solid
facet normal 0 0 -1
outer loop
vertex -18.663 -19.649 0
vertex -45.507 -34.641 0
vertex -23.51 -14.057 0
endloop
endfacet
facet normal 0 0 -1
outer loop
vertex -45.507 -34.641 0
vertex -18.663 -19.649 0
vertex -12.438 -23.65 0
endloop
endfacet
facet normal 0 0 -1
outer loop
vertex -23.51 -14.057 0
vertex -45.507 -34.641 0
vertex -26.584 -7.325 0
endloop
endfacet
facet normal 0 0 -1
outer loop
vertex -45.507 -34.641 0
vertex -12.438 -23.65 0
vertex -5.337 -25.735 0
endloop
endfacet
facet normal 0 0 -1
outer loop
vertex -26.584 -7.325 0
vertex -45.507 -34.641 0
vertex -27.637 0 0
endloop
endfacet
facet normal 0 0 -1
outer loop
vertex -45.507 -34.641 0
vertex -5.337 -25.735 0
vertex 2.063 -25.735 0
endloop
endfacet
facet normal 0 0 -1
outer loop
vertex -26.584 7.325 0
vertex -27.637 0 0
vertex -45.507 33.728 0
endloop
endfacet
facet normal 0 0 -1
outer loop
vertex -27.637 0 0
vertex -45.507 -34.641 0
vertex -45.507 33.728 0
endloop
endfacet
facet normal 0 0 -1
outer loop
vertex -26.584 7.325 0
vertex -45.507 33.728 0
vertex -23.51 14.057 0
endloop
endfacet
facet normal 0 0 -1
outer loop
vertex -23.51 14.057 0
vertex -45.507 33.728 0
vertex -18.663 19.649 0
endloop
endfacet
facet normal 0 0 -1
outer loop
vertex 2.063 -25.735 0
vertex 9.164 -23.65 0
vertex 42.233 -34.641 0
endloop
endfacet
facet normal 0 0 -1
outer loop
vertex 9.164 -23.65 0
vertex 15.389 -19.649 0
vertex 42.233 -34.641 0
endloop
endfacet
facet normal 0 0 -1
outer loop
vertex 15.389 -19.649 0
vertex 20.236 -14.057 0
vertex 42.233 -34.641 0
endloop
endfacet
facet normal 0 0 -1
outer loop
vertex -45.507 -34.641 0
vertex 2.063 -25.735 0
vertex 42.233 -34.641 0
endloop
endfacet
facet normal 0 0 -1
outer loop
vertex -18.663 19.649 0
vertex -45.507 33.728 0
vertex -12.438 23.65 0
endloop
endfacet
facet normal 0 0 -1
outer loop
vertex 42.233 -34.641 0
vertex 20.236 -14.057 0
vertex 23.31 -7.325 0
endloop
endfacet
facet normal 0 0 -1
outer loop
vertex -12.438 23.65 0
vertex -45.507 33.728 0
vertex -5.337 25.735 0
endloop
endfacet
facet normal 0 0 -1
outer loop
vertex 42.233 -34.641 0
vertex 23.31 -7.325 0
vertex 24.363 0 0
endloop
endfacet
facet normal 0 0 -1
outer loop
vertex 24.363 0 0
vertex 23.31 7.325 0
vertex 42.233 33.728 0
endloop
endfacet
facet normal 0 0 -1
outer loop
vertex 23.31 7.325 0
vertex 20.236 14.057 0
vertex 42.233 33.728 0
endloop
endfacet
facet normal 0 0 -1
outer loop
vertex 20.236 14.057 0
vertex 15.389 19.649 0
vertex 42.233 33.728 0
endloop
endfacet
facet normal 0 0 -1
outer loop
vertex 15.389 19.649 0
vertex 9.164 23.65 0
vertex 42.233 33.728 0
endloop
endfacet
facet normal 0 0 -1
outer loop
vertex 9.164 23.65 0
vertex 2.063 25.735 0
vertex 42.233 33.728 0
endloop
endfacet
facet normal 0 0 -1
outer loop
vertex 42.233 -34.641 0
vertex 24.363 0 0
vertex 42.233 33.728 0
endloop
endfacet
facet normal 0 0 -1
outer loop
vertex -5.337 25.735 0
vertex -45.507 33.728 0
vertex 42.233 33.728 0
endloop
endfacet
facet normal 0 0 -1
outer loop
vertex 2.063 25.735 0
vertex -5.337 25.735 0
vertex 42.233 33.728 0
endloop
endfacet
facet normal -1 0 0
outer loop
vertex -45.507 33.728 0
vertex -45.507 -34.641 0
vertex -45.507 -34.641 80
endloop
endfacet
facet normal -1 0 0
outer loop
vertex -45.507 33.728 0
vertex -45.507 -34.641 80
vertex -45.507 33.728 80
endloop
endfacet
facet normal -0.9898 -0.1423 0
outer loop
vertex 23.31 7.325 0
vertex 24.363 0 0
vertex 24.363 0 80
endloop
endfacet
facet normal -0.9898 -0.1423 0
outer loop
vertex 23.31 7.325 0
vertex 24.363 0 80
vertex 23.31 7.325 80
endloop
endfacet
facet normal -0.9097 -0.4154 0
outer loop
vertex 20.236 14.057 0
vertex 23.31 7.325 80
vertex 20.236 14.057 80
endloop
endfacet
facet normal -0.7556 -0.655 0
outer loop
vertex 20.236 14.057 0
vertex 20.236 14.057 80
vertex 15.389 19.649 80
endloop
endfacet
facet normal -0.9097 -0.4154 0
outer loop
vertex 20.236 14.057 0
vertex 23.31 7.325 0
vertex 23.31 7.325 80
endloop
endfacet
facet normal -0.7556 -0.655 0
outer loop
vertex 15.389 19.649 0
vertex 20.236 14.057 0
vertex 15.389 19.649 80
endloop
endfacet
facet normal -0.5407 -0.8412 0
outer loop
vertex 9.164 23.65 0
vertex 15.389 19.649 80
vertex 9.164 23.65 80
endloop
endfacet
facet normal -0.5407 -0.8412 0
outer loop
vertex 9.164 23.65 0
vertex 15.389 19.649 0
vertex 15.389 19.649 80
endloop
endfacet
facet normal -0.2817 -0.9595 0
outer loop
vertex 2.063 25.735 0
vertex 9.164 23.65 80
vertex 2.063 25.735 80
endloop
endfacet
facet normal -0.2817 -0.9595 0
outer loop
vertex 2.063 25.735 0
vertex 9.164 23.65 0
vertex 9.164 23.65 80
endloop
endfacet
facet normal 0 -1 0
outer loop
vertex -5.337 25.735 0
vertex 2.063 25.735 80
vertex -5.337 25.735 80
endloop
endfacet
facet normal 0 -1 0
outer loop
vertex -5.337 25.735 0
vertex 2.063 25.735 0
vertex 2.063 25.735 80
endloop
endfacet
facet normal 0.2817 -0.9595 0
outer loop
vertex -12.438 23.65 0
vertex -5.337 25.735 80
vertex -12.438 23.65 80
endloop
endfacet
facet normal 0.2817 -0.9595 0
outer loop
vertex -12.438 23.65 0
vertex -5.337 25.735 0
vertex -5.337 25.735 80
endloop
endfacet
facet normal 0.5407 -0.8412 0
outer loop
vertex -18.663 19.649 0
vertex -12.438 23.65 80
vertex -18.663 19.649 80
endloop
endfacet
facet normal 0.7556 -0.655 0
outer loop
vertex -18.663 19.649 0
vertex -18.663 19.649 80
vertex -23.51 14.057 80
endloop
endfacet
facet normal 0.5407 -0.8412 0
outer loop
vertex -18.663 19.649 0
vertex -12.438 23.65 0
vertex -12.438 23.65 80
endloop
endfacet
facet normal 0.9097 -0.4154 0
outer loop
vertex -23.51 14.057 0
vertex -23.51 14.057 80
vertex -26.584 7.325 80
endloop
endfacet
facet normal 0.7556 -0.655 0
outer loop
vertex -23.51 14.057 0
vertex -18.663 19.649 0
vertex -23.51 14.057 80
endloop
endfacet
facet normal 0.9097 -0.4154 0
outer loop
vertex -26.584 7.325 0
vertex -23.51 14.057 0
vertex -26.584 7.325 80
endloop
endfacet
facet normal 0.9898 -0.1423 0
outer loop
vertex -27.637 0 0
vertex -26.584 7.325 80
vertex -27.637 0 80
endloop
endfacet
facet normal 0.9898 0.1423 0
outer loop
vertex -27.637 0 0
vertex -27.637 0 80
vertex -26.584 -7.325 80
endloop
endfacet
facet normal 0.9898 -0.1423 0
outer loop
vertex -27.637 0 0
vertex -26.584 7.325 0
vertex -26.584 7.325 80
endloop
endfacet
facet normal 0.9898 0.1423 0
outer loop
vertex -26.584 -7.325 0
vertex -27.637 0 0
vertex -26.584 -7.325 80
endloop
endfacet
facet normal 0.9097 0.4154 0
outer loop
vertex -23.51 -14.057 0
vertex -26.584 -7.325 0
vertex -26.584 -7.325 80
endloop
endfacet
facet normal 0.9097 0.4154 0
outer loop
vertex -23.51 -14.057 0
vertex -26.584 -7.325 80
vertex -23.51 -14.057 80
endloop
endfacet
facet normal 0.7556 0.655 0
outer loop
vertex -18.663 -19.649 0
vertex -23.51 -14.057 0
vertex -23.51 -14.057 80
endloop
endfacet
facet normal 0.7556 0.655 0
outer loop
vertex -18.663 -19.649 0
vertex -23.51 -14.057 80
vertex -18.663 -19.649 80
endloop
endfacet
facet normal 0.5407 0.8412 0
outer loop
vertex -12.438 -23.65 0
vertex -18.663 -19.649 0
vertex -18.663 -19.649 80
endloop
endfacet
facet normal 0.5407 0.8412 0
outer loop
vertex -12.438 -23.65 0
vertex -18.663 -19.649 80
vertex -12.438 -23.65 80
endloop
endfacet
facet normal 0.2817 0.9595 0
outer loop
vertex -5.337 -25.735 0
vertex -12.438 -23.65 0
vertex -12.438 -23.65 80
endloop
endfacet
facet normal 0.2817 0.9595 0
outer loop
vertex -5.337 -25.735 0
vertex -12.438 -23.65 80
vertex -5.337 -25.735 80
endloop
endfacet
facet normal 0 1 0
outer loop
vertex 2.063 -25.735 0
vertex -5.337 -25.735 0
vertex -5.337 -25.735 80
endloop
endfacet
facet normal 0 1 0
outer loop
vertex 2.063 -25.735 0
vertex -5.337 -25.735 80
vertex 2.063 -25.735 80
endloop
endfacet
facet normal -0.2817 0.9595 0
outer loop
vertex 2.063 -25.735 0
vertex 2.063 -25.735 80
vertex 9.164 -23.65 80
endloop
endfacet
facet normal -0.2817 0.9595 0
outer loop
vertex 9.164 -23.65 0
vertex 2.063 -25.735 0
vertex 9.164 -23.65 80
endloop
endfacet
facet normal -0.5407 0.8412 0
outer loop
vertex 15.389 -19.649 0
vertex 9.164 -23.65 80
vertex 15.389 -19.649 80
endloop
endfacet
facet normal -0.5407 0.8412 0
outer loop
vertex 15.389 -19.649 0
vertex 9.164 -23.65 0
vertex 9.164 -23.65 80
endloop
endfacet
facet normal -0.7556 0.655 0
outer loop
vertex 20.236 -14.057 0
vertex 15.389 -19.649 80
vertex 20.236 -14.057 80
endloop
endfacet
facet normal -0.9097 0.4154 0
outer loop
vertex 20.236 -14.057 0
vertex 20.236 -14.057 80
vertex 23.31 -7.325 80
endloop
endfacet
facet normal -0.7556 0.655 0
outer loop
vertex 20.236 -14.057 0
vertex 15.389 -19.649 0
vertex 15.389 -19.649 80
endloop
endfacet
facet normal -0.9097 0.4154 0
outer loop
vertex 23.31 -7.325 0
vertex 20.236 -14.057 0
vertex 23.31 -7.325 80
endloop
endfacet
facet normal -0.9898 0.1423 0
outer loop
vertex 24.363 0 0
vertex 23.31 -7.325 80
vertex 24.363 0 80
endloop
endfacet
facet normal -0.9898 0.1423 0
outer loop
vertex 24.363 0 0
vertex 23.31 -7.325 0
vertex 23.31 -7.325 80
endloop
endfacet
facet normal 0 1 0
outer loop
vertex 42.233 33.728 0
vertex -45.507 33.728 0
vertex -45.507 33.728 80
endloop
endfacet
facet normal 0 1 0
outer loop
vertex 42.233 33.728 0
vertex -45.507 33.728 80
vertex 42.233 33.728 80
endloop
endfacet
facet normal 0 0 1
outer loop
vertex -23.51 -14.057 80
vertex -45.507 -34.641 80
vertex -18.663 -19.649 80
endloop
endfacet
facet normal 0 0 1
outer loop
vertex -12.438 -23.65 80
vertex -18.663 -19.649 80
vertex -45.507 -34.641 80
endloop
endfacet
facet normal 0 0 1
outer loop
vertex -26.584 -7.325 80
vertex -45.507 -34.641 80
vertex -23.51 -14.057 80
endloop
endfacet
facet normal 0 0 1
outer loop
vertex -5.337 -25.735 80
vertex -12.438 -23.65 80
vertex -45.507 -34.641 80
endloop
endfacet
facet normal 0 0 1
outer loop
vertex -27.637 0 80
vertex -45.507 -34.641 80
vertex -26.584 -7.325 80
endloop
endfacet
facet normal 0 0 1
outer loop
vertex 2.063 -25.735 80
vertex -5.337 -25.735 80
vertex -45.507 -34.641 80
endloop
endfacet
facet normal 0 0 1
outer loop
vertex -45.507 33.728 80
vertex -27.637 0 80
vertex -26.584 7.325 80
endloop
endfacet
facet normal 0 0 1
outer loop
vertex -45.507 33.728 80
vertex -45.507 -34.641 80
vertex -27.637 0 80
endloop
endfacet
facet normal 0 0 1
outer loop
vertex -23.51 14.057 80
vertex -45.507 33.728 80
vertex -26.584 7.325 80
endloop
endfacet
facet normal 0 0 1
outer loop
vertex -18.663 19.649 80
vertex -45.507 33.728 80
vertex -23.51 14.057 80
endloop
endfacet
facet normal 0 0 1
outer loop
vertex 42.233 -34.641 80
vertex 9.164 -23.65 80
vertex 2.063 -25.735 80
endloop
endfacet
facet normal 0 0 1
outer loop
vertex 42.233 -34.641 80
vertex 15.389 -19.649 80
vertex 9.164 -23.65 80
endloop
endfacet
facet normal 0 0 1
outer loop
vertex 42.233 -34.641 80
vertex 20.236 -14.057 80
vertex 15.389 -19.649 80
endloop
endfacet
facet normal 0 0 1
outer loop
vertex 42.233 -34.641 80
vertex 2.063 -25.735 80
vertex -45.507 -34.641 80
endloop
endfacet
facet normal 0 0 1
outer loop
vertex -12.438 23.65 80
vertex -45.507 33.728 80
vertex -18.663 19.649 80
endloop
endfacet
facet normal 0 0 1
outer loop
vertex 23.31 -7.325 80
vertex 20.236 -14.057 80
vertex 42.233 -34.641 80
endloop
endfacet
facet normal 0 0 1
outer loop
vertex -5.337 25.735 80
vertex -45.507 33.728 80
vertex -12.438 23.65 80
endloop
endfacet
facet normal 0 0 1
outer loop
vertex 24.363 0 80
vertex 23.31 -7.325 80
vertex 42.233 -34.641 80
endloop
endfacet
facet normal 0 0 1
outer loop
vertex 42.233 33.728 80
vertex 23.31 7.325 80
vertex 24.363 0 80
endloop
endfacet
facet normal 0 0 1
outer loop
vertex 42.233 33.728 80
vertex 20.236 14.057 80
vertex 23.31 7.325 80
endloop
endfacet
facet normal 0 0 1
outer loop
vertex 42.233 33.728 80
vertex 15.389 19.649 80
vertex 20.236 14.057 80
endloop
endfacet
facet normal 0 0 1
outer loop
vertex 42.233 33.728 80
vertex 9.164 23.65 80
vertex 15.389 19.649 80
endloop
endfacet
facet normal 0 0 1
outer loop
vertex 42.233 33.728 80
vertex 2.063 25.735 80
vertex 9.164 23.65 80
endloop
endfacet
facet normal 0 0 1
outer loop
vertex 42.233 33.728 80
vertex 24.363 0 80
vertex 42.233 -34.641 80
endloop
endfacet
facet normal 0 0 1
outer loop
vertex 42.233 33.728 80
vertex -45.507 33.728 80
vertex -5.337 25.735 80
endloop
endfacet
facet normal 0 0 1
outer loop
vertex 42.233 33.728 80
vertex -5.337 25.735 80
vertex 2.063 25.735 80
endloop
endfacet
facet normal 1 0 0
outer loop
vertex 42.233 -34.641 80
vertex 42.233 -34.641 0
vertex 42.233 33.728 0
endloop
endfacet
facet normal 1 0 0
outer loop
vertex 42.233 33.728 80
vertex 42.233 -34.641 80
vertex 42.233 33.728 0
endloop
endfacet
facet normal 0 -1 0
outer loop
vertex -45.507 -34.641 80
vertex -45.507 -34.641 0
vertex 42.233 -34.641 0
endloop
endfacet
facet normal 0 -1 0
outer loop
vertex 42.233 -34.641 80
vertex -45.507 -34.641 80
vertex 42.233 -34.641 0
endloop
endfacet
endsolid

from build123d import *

# Parameters (mm, degrees)
SKETCH_1_W      = 87.739735524
SKETCH_1_H      = 68.368625084
SKETCH_1_R      = 26
EXTRUDE_1_DEPTH = 80


with BuildPart() as part:
    # 草图1 → 凸台-拉伸1 (new body)
    with BuildSketch(Plane.XY):
        with Locations((-1.63708593, -0.456202936)):
            Rectangle(SKETCH_1_W, SKETCH_1_H)
        with Locations((-1.63708593, 0)):
            Circle(SKETCH_1_R, mode=Mode.SUBTRACT)
    extrude(amount=EXTRUDE_1_DEPTH)


solid = part.part
